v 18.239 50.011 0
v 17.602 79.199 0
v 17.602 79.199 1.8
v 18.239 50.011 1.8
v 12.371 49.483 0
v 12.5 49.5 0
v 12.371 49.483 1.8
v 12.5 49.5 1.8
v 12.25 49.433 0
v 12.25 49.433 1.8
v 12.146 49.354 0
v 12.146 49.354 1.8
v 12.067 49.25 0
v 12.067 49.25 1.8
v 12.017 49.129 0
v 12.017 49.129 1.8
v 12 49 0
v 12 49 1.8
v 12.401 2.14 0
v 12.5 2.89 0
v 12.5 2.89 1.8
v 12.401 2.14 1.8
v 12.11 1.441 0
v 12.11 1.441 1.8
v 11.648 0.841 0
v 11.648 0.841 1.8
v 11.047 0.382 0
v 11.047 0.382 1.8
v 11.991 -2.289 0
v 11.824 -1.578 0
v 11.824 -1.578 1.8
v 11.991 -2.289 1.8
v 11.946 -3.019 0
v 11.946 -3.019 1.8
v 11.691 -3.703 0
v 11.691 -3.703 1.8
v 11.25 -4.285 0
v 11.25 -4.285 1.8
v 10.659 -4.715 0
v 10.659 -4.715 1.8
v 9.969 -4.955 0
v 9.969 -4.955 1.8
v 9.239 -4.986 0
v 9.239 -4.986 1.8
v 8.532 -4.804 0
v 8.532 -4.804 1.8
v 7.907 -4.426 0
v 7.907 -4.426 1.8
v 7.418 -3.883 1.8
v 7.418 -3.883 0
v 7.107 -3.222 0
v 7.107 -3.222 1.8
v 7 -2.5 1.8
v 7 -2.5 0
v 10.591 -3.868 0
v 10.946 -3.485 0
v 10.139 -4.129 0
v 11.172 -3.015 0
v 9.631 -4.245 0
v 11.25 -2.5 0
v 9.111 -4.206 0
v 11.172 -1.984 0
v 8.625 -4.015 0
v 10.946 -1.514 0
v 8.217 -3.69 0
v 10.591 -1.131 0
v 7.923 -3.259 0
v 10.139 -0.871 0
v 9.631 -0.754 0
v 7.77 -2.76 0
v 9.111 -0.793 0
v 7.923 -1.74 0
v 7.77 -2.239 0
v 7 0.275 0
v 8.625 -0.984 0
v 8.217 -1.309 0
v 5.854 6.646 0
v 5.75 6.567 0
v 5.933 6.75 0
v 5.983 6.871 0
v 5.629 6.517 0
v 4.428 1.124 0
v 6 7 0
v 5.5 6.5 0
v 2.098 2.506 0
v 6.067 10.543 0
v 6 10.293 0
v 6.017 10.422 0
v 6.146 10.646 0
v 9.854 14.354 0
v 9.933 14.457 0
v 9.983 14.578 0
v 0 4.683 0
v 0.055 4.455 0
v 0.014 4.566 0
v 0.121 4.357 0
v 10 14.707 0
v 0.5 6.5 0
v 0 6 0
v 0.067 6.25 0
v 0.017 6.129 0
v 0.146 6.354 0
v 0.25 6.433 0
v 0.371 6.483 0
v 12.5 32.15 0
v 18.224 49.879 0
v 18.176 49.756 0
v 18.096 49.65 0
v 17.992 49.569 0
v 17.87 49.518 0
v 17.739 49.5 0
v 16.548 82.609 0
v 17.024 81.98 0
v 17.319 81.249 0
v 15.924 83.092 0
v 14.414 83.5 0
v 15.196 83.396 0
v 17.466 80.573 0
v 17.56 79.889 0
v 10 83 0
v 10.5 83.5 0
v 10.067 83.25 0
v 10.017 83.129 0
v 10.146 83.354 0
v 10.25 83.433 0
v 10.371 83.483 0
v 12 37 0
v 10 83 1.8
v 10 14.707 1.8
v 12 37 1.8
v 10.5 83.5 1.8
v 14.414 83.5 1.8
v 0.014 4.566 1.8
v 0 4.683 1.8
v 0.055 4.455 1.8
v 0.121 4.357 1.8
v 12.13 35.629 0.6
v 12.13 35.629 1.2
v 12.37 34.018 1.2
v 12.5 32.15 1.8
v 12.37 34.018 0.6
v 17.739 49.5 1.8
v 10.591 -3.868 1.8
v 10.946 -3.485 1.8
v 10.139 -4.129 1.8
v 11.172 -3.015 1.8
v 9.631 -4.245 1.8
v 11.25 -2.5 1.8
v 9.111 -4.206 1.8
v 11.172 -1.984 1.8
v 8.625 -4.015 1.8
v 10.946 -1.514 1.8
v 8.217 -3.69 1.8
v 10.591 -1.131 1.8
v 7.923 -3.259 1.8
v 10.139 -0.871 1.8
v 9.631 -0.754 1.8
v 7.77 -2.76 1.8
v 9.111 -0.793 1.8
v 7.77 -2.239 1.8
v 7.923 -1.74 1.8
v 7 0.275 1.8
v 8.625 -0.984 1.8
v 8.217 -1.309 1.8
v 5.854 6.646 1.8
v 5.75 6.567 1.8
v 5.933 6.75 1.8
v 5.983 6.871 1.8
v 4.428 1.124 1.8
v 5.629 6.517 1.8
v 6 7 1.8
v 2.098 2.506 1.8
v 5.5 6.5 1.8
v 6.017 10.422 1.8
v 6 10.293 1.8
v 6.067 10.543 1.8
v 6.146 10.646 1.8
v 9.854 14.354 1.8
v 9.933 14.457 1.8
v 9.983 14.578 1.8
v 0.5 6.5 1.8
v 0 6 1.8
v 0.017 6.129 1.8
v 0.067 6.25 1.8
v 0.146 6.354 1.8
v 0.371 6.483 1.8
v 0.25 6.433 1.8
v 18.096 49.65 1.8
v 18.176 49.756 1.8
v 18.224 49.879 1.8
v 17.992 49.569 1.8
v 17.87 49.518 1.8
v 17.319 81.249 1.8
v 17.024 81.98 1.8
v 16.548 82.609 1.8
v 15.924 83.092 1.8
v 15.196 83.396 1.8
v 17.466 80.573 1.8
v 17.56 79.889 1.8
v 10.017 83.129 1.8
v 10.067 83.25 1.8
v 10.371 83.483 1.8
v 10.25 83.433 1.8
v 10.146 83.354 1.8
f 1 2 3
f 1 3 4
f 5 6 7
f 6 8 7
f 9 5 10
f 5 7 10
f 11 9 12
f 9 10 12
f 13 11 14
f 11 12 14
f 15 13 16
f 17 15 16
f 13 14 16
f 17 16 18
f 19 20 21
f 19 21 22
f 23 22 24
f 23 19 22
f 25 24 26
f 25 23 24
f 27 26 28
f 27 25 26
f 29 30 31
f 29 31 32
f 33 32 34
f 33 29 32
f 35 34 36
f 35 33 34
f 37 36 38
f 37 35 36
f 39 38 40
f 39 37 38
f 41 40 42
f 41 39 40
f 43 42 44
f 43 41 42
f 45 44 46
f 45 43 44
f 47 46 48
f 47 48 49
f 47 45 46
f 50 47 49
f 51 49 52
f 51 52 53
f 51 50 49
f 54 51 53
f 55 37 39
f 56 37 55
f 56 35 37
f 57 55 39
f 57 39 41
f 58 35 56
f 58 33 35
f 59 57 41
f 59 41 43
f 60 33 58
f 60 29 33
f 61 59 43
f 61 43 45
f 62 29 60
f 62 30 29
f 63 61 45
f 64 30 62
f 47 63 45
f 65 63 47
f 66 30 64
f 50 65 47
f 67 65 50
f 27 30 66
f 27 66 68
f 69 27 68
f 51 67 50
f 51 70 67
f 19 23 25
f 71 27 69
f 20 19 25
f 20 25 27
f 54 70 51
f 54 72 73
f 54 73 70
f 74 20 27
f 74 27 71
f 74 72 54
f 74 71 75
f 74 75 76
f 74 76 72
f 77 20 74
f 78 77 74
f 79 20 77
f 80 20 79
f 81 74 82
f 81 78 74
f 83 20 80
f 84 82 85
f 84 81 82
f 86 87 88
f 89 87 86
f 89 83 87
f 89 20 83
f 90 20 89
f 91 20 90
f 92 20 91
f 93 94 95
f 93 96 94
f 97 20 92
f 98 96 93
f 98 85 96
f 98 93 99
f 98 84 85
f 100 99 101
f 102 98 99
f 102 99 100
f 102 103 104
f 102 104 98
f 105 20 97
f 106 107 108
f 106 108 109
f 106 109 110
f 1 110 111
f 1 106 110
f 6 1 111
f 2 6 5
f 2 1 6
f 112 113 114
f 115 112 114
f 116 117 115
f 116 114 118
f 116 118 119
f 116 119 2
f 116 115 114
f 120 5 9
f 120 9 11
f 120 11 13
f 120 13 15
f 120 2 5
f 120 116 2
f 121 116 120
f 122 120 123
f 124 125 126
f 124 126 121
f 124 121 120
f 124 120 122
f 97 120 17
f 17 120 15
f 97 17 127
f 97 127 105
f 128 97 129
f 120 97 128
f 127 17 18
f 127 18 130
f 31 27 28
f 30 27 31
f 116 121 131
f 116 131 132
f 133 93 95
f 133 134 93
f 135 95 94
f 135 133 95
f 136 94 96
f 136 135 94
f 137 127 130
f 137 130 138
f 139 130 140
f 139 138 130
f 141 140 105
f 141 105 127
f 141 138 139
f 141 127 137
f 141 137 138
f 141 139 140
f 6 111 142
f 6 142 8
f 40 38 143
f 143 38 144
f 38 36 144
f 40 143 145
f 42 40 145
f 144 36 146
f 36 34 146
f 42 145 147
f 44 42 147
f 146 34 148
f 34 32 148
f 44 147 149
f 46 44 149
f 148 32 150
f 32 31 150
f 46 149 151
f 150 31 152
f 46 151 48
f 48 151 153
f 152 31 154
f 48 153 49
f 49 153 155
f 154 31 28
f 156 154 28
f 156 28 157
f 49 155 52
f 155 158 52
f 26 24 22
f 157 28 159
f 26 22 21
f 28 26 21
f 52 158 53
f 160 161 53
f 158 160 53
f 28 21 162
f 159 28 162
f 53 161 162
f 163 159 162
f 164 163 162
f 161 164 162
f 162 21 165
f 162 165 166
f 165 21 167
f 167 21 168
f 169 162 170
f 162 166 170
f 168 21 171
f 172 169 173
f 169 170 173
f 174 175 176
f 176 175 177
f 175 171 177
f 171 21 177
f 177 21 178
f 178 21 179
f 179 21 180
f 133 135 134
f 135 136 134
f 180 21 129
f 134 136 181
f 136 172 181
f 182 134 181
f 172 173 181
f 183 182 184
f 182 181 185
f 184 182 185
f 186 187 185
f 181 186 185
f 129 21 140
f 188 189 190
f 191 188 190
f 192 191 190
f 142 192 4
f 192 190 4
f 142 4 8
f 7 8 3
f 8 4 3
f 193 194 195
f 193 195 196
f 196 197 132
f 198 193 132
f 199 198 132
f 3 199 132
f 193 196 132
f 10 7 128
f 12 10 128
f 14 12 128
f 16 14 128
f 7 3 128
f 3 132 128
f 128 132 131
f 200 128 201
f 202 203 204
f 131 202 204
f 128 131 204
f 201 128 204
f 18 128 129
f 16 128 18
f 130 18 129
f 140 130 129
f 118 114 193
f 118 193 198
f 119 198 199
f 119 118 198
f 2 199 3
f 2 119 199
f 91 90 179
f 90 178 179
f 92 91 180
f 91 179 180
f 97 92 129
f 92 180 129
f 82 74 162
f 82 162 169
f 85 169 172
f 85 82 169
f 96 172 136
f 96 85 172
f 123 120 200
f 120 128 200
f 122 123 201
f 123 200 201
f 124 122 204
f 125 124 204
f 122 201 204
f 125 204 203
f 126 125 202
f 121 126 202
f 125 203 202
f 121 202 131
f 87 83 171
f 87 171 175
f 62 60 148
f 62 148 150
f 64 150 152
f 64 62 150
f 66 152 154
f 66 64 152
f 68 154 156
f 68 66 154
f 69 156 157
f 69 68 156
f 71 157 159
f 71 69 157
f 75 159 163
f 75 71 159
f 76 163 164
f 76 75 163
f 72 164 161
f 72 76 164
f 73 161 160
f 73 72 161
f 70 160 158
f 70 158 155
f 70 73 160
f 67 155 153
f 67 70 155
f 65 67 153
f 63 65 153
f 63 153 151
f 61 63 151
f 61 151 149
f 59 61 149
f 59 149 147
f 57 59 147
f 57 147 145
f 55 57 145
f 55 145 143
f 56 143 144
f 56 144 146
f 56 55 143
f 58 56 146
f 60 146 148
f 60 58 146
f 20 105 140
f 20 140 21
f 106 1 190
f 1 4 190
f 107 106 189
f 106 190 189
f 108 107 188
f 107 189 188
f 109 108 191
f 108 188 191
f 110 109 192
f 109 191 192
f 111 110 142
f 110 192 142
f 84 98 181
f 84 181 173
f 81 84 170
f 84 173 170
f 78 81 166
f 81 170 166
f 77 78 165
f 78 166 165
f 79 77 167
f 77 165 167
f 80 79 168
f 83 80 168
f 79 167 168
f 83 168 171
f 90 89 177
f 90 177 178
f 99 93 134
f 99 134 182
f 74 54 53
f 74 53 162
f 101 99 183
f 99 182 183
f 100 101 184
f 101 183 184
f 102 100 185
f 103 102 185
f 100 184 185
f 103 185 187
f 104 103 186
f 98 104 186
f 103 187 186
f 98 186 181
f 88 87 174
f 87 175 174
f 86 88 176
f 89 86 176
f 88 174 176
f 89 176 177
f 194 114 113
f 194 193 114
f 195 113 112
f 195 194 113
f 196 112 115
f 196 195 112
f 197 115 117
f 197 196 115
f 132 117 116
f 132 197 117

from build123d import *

# Parameters (mm, degrees)
BOSS_EXTRUDE1_DEPTH = 1.8
FILLET1_R           = 0.5
SKETCH2_R           = 1.75
BOSS_EXTRUDE3_DEPTH = 1.8
FILLET2_R           = 3


with BuildPart() as part:
    # Sketch1 → Boss-Extrude1 (new body)
    with BuildSketch(Plane.XY):
        with BuildLine():
            Line((0, 4.5), (0, 6.5))
            Line((0, 6.5), (6, 6.5))
            Line((6, 6.5), (6, 10.5))
            Line((6, 10.5), (10, 14.5))
            Line((10, 14.5), (10, 83.5))
            Line((10, 83.5), (16.4, 83.5))
            ThreePointArc((16.4, 83.5), (17.2719581, 81.425344658), (17.601960582, 79.199226044))
            Line((17.601960582, 79.199226044), (18.25, 49.5))
            Line((18.25, 49.5), (12, 49.5))
            Line((12, 49.5), (12, 37))
            add(Edge.make_bspline(
                [(12, 37), (12, 35.742192932), (12.5, 34.153450807), (12.5, 32.15)],
                knots=[0, 0, 0, 0, 1, 1, 1, 1], degree=3))
            Line((12.5, 32.15), (12.5, 2.89))
            ThreePointArc((12.5, 2.89), (11.653538598, 0.846461402), (9.61, 0))
            ThreePointArc((9.61, 0), (4.304293167, 1.180712741), (0, 4.5))
        make_face()
    extrude(amount=BOSS_EXTRUDE1_DEPTH)

    # Fillet1
    fillet1_edges = [part.edges().sort_by_distance(p)[0] for p in [
        (0, 4.5, 0.9),
        (0, 6.5, 0.9),
        (6, 6.5, 0.9),
        (6, 10.5, 0.9),
        (10, 14.5, 0.9),
        (10, 83.5, 0.9),
        (18.25, 49.5, 0.9),
        (12, 49.5, 0.9),
    ]]
    fillet(fillet1_edges, radius=FILLET1_R)

    # Sketch2 → Boss-Extrude3 (add)
    with BuildSketch(Plane.XY):
        with BuildLine():
            Line((7, -2.499596966), (7, 0.500403034))
            Line((7, 0.500403034), (11, 0.500403034))
            Line((11, 0.500403034), (11.824045318, -1.578286292))
            ThreePointArc((11.824045318, -1.578286292), (9.968981185, -4.955214332), (7, -2.499596966))
        make_face()
        with Locations((9.5, -2.499596966)):
            Circle(SKETCH2_R, mode=Mode.SUBTRACT)
    extrude(amount=BOSS_EXTRUDE3_DEPTH)

    # Fillet2
    fillet2_edges = [part.edges().sort_by_distance(p)[0] for p in [
        (16.4, 83.5, 0.9),
    ]]
    fillet(fillet2_edges, radius=FILLET2_R)


solid = part.part
